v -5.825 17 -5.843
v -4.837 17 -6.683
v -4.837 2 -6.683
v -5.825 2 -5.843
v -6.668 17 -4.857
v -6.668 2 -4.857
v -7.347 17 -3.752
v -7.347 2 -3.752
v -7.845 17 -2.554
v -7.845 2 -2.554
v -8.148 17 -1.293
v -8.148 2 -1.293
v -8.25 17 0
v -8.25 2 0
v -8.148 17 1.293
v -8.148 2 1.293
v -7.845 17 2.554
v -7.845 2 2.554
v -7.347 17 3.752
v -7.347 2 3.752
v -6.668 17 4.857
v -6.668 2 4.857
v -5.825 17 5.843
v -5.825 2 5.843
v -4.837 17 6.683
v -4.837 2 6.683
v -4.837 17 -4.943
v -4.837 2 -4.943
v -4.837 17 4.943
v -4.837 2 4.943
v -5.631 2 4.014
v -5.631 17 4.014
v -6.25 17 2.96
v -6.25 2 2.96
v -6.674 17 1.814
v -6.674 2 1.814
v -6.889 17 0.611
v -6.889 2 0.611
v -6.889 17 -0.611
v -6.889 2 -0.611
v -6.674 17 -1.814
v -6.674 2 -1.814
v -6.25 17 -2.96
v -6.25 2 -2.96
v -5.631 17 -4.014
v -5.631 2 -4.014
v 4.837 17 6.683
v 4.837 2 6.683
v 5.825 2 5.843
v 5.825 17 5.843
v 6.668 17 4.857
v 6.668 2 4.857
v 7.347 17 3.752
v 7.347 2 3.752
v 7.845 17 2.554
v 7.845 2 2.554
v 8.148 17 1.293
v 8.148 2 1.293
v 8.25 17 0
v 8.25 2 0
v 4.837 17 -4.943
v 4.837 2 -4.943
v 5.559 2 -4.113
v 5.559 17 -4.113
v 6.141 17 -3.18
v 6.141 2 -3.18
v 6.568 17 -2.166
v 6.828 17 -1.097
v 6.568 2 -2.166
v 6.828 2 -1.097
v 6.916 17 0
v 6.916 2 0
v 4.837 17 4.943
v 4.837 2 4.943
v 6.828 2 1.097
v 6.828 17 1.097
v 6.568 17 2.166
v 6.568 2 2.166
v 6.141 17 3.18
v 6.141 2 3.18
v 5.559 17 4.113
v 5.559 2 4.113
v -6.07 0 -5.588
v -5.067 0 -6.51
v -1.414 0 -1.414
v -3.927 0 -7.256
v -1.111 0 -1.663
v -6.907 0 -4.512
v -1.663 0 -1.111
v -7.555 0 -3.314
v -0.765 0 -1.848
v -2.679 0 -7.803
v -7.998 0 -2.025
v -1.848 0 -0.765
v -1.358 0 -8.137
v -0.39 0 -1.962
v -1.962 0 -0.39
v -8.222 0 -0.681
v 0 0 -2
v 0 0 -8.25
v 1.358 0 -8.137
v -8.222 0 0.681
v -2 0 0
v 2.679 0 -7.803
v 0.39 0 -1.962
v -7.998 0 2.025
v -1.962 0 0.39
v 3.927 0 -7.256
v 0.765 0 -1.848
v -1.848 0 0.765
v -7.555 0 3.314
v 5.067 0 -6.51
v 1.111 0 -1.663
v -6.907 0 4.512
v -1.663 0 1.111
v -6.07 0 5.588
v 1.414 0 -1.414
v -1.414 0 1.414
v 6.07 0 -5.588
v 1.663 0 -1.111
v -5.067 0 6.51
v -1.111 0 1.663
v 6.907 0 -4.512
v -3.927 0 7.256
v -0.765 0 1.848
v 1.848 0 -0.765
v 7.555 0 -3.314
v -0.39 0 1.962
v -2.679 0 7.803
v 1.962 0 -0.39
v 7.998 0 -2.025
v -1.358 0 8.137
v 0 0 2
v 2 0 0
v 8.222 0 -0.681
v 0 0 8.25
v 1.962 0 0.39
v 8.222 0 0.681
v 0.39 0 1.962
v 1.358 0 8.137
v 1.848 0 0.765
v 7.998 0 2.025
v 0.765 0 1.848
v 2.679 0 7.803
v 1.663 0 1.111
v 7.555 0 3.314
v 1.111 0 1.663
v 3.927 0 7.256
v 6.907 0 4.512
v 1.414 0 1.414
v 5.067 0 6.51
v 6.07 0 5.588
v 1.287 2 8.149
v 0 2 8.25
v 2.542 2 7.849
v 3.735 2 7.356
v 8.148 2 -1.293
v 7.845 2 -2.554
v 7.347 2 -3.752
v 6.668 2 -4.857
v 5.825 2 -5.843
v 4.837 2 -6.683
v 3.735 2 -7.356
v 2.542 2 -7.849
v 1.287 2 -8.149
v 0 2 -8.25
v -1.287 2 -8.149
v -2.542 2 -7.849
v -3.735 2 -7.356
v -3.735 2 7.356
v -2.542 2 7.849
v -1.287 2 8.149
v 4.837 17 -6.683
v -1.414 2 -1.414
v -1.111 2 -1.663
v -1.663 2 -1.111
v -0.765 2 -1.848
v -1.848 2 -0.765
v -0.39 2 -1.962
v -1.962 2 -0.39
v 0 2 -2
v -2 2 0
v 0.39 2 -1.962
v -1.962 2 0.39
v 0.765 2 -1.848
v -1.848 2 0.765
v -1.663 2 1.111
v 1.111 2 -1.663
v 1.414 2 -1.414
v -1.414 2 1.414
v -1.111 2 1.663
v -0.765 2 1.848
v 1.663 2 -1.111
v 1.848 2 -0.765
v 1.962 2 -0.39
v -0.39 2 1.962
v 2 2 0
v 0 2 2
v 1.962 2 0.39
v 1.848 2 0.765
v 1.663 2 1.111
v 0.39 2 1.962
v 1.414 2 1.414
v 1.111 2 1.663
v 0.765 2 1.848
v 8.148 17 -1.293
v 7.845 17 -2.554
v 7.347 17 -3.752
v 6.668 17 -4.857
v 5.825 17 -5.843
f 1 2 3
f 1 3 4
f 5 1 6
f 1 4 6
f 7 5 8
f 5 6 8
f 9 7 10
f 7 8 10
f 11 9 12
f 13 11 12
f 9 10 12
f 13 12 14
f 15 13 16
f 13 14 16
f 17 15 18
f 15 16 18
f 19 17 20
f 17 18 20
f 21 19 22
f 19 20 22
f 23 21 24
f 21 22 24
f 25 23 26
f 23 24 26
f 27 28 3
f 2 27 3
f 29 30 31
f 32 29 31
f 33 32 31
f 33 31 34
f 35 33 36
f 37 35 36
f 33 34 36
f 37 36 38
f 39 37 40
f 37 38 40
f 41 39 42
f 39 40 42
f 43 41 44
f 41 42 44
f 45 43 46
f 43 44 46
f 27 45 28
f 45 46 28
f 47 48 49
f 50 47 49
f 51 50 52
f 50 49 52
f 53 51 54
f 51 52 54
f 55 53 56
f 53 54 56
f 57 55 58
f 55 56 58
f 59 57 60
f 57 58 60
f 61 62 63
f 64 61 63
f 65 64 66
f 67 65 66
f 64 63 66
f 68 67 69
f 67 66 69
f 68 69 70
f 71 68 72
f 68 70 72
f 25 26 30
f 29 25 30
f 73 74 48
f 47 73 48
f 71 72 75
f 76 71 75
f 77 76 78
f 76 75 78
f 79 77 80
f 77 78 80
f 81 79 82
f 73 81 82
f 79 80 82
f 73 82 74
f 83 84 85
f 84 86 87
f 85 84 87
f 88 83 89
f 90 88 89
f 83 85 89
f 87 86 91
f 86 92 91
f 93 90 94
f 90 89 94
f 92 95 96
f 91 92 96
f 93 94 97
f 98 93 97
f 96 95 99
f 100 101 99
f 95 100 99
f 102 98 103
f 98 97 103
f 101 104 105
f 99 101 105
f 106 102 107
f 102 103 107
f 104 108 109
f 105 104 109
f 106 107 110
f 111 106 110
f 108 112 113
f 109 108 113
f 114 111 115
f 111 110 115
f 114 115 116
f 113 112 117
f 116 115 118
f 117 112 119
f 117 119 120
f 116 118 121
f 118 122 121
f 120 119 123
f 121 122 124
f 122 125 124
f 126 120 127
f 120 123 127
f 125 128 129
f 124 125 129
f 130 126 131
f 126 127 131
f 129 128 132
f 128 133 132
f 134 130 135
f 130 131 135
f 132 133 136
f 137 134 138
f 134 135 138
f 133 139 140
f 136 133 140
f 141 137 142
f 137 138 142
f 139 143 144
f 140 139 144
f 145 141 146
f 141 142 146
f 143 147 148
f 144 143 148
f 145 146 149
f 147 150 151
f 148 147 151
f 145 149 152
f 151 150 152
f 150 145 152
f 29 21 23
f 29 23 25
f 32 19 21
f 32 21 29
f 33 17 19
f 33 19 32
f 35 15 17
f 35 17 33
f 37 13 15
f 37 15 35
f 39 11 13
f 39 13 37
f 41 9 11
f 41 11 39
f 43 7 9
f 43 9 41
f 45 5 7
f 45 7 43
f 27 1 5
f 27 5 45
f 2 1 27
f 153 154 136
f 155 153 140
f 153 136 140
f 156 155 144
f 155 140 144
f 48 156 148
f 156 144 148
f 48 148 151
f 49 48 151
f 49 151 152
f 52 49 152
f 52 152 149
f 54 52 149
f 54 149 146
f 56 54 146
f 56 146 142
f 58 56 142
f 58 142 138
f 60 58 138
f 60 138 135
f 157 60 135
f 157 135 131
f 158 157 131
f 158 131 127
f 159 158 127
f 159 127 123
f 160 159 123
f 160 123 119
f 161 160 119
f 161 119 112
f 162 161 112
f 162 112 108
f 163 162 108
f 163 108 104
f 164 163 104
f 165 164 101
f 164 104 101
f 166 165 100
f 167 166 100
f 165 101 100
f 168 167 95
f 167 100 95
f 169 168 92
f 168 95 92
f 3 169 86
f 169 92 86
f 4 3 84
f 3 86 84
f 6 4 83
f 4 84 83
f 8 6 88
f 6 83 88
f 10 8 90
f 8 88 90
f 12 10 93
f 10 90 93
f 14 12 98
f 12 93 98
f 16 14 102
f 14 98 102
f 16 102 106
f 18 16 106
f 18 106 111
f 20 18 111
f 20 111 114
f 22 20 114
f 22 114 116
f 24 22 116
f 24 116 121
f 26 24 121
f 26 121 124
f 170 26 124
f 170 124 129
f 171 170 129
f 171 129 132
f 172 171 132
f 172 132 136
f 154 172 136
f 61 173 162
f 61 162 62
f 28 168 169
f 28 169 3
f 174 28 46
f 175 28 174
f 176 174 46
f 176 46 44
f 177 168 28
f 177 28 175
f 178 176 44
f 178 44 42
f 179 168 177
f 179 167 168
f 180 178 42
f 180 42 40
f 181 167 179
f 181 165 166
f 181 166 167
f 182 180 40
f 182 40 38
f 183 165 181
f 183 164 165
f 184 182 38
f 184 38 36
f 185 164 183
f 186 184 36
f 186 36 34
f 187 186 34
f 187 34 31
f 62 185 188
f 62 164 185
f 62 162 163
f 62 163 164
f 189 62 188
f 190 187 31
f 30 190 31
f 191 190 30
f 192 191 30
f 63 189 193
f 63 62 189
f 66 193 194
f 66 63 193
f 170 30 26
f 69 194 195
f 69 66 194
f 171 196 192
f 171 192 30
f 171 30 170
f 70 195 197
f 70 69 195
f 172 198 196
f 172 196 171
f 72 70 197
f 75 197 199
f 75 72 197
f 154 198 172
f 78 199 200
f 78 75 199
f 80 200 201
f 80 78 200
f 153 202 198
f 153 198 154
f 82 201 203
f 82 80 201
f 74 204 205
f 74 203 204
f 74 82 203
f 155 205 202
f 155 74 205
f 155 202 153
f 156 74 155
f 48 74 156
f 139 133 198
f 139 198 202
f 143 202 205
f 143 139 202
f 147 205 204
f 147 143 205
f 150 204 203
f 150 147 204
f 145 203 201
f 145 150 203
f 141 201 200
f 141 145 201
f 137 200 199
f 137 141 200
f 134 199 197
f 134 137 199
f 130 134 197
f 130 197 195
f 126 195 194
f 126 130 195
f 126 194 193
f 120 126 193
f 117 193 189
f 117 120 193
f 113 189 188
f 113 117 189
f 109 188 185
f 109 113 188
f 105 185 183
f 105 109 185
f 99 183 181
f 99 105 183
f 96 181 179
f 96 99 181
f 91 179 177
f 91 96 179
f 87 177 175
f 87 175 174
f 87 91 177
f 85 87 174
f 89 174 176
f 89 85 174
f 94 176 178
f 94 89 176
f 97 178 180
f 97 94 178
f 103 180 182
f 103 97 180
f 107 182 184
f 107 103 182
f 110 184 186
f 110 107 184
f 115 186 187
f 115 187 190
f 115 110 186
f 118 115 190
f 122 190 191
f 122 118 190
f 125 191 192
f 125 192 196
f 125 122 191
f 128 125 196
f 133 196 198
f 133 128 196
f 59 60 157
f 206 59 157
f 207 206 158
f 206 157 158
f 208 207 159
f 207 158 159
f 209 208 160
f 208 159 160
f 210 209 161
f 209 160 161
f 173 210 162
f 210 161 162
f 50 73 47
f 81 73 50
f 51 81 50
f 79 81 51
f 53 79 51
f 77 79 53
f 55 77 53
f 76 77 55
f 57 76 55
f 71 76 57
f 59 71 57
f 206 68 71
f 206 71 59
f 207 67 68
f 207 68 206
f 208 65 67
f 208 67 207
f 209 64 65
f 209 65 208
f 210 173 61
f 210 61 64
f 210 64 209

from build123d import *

# Parameters (mm, degrees)
SKETCH2_R           = 8.25
SKETCH2_R_2         = 2
BOSS_EXTRUDE1_DEPTH = 2
BOSS_EXTRUDE2_DEPTH = 15


with BuildPart() as part:
    # Sketch2 → Boss-Extrude1 (new body)
    with BuildSketch(Plane(origin=(0, 0, 0), x_dir=(1, 0, 0), z_dir=(0, 1, 0))):
        with Locations(Location((0, 0, 0), (0, 0, 270))):
            Circle(SKETCH2_R)
        with Locations(Location((0, 0, 0), (0, 0, 270))):
            Circle(SKETCH2_R_2, mode=Mode.SUBTRACT)
    extrude(amount=BOSS_EXTRUDE1_DEPTH)

    # Sketch3 → Boss-Extrude2 (add)
    with BuildSketch(Plane(origin=(0, 2, 0), x_dir=(1, 0, 0), z_dir=(0, 1, 0))):
        with BuildLine():
            ThreePointArc((-4.836821281, 6.683386858), (-8.25, 0), (-4.836821281, -6.683386858))
            Line((-4.836821281, -6.683386858), (-4.836821281, -4.942960119))
            ThreePointArc((-4.836821281, -4.942960119), (-6.915756997, 0), (-4.836821281, 4.942960119))
            Line((-4.836821281, 4.942960119), (-4.836821281, 6.683386858))
        make_face()
        with BuildLine():
            Line((4.836821281, -4.942960119), (4.836821281, -6.683386858))
            ThreePointArc((4.836821281, -6.683386858), (7.34732181, -3.752247622), (8.25, 0))
            ThreePointArc((8.25, 0), (7.34732181, 3.752247622), (4.836821281, 6.683386858))
            Line((4.836821281, 6.683386858), (4.836821281, 4.942960119))
            ThreePointArc((4.836821281, 4.942960119), (6.374871585, 2.681176442), (6.915756997, 0))
            ThreePointArc((6.915756997, 0), (6.374871585, -2.681176442), (4.836821281, -4.942960119))
        make_face()
    extrude(amount=BOSS_EXTRUDE2_DEPTH)


solid = part.part
